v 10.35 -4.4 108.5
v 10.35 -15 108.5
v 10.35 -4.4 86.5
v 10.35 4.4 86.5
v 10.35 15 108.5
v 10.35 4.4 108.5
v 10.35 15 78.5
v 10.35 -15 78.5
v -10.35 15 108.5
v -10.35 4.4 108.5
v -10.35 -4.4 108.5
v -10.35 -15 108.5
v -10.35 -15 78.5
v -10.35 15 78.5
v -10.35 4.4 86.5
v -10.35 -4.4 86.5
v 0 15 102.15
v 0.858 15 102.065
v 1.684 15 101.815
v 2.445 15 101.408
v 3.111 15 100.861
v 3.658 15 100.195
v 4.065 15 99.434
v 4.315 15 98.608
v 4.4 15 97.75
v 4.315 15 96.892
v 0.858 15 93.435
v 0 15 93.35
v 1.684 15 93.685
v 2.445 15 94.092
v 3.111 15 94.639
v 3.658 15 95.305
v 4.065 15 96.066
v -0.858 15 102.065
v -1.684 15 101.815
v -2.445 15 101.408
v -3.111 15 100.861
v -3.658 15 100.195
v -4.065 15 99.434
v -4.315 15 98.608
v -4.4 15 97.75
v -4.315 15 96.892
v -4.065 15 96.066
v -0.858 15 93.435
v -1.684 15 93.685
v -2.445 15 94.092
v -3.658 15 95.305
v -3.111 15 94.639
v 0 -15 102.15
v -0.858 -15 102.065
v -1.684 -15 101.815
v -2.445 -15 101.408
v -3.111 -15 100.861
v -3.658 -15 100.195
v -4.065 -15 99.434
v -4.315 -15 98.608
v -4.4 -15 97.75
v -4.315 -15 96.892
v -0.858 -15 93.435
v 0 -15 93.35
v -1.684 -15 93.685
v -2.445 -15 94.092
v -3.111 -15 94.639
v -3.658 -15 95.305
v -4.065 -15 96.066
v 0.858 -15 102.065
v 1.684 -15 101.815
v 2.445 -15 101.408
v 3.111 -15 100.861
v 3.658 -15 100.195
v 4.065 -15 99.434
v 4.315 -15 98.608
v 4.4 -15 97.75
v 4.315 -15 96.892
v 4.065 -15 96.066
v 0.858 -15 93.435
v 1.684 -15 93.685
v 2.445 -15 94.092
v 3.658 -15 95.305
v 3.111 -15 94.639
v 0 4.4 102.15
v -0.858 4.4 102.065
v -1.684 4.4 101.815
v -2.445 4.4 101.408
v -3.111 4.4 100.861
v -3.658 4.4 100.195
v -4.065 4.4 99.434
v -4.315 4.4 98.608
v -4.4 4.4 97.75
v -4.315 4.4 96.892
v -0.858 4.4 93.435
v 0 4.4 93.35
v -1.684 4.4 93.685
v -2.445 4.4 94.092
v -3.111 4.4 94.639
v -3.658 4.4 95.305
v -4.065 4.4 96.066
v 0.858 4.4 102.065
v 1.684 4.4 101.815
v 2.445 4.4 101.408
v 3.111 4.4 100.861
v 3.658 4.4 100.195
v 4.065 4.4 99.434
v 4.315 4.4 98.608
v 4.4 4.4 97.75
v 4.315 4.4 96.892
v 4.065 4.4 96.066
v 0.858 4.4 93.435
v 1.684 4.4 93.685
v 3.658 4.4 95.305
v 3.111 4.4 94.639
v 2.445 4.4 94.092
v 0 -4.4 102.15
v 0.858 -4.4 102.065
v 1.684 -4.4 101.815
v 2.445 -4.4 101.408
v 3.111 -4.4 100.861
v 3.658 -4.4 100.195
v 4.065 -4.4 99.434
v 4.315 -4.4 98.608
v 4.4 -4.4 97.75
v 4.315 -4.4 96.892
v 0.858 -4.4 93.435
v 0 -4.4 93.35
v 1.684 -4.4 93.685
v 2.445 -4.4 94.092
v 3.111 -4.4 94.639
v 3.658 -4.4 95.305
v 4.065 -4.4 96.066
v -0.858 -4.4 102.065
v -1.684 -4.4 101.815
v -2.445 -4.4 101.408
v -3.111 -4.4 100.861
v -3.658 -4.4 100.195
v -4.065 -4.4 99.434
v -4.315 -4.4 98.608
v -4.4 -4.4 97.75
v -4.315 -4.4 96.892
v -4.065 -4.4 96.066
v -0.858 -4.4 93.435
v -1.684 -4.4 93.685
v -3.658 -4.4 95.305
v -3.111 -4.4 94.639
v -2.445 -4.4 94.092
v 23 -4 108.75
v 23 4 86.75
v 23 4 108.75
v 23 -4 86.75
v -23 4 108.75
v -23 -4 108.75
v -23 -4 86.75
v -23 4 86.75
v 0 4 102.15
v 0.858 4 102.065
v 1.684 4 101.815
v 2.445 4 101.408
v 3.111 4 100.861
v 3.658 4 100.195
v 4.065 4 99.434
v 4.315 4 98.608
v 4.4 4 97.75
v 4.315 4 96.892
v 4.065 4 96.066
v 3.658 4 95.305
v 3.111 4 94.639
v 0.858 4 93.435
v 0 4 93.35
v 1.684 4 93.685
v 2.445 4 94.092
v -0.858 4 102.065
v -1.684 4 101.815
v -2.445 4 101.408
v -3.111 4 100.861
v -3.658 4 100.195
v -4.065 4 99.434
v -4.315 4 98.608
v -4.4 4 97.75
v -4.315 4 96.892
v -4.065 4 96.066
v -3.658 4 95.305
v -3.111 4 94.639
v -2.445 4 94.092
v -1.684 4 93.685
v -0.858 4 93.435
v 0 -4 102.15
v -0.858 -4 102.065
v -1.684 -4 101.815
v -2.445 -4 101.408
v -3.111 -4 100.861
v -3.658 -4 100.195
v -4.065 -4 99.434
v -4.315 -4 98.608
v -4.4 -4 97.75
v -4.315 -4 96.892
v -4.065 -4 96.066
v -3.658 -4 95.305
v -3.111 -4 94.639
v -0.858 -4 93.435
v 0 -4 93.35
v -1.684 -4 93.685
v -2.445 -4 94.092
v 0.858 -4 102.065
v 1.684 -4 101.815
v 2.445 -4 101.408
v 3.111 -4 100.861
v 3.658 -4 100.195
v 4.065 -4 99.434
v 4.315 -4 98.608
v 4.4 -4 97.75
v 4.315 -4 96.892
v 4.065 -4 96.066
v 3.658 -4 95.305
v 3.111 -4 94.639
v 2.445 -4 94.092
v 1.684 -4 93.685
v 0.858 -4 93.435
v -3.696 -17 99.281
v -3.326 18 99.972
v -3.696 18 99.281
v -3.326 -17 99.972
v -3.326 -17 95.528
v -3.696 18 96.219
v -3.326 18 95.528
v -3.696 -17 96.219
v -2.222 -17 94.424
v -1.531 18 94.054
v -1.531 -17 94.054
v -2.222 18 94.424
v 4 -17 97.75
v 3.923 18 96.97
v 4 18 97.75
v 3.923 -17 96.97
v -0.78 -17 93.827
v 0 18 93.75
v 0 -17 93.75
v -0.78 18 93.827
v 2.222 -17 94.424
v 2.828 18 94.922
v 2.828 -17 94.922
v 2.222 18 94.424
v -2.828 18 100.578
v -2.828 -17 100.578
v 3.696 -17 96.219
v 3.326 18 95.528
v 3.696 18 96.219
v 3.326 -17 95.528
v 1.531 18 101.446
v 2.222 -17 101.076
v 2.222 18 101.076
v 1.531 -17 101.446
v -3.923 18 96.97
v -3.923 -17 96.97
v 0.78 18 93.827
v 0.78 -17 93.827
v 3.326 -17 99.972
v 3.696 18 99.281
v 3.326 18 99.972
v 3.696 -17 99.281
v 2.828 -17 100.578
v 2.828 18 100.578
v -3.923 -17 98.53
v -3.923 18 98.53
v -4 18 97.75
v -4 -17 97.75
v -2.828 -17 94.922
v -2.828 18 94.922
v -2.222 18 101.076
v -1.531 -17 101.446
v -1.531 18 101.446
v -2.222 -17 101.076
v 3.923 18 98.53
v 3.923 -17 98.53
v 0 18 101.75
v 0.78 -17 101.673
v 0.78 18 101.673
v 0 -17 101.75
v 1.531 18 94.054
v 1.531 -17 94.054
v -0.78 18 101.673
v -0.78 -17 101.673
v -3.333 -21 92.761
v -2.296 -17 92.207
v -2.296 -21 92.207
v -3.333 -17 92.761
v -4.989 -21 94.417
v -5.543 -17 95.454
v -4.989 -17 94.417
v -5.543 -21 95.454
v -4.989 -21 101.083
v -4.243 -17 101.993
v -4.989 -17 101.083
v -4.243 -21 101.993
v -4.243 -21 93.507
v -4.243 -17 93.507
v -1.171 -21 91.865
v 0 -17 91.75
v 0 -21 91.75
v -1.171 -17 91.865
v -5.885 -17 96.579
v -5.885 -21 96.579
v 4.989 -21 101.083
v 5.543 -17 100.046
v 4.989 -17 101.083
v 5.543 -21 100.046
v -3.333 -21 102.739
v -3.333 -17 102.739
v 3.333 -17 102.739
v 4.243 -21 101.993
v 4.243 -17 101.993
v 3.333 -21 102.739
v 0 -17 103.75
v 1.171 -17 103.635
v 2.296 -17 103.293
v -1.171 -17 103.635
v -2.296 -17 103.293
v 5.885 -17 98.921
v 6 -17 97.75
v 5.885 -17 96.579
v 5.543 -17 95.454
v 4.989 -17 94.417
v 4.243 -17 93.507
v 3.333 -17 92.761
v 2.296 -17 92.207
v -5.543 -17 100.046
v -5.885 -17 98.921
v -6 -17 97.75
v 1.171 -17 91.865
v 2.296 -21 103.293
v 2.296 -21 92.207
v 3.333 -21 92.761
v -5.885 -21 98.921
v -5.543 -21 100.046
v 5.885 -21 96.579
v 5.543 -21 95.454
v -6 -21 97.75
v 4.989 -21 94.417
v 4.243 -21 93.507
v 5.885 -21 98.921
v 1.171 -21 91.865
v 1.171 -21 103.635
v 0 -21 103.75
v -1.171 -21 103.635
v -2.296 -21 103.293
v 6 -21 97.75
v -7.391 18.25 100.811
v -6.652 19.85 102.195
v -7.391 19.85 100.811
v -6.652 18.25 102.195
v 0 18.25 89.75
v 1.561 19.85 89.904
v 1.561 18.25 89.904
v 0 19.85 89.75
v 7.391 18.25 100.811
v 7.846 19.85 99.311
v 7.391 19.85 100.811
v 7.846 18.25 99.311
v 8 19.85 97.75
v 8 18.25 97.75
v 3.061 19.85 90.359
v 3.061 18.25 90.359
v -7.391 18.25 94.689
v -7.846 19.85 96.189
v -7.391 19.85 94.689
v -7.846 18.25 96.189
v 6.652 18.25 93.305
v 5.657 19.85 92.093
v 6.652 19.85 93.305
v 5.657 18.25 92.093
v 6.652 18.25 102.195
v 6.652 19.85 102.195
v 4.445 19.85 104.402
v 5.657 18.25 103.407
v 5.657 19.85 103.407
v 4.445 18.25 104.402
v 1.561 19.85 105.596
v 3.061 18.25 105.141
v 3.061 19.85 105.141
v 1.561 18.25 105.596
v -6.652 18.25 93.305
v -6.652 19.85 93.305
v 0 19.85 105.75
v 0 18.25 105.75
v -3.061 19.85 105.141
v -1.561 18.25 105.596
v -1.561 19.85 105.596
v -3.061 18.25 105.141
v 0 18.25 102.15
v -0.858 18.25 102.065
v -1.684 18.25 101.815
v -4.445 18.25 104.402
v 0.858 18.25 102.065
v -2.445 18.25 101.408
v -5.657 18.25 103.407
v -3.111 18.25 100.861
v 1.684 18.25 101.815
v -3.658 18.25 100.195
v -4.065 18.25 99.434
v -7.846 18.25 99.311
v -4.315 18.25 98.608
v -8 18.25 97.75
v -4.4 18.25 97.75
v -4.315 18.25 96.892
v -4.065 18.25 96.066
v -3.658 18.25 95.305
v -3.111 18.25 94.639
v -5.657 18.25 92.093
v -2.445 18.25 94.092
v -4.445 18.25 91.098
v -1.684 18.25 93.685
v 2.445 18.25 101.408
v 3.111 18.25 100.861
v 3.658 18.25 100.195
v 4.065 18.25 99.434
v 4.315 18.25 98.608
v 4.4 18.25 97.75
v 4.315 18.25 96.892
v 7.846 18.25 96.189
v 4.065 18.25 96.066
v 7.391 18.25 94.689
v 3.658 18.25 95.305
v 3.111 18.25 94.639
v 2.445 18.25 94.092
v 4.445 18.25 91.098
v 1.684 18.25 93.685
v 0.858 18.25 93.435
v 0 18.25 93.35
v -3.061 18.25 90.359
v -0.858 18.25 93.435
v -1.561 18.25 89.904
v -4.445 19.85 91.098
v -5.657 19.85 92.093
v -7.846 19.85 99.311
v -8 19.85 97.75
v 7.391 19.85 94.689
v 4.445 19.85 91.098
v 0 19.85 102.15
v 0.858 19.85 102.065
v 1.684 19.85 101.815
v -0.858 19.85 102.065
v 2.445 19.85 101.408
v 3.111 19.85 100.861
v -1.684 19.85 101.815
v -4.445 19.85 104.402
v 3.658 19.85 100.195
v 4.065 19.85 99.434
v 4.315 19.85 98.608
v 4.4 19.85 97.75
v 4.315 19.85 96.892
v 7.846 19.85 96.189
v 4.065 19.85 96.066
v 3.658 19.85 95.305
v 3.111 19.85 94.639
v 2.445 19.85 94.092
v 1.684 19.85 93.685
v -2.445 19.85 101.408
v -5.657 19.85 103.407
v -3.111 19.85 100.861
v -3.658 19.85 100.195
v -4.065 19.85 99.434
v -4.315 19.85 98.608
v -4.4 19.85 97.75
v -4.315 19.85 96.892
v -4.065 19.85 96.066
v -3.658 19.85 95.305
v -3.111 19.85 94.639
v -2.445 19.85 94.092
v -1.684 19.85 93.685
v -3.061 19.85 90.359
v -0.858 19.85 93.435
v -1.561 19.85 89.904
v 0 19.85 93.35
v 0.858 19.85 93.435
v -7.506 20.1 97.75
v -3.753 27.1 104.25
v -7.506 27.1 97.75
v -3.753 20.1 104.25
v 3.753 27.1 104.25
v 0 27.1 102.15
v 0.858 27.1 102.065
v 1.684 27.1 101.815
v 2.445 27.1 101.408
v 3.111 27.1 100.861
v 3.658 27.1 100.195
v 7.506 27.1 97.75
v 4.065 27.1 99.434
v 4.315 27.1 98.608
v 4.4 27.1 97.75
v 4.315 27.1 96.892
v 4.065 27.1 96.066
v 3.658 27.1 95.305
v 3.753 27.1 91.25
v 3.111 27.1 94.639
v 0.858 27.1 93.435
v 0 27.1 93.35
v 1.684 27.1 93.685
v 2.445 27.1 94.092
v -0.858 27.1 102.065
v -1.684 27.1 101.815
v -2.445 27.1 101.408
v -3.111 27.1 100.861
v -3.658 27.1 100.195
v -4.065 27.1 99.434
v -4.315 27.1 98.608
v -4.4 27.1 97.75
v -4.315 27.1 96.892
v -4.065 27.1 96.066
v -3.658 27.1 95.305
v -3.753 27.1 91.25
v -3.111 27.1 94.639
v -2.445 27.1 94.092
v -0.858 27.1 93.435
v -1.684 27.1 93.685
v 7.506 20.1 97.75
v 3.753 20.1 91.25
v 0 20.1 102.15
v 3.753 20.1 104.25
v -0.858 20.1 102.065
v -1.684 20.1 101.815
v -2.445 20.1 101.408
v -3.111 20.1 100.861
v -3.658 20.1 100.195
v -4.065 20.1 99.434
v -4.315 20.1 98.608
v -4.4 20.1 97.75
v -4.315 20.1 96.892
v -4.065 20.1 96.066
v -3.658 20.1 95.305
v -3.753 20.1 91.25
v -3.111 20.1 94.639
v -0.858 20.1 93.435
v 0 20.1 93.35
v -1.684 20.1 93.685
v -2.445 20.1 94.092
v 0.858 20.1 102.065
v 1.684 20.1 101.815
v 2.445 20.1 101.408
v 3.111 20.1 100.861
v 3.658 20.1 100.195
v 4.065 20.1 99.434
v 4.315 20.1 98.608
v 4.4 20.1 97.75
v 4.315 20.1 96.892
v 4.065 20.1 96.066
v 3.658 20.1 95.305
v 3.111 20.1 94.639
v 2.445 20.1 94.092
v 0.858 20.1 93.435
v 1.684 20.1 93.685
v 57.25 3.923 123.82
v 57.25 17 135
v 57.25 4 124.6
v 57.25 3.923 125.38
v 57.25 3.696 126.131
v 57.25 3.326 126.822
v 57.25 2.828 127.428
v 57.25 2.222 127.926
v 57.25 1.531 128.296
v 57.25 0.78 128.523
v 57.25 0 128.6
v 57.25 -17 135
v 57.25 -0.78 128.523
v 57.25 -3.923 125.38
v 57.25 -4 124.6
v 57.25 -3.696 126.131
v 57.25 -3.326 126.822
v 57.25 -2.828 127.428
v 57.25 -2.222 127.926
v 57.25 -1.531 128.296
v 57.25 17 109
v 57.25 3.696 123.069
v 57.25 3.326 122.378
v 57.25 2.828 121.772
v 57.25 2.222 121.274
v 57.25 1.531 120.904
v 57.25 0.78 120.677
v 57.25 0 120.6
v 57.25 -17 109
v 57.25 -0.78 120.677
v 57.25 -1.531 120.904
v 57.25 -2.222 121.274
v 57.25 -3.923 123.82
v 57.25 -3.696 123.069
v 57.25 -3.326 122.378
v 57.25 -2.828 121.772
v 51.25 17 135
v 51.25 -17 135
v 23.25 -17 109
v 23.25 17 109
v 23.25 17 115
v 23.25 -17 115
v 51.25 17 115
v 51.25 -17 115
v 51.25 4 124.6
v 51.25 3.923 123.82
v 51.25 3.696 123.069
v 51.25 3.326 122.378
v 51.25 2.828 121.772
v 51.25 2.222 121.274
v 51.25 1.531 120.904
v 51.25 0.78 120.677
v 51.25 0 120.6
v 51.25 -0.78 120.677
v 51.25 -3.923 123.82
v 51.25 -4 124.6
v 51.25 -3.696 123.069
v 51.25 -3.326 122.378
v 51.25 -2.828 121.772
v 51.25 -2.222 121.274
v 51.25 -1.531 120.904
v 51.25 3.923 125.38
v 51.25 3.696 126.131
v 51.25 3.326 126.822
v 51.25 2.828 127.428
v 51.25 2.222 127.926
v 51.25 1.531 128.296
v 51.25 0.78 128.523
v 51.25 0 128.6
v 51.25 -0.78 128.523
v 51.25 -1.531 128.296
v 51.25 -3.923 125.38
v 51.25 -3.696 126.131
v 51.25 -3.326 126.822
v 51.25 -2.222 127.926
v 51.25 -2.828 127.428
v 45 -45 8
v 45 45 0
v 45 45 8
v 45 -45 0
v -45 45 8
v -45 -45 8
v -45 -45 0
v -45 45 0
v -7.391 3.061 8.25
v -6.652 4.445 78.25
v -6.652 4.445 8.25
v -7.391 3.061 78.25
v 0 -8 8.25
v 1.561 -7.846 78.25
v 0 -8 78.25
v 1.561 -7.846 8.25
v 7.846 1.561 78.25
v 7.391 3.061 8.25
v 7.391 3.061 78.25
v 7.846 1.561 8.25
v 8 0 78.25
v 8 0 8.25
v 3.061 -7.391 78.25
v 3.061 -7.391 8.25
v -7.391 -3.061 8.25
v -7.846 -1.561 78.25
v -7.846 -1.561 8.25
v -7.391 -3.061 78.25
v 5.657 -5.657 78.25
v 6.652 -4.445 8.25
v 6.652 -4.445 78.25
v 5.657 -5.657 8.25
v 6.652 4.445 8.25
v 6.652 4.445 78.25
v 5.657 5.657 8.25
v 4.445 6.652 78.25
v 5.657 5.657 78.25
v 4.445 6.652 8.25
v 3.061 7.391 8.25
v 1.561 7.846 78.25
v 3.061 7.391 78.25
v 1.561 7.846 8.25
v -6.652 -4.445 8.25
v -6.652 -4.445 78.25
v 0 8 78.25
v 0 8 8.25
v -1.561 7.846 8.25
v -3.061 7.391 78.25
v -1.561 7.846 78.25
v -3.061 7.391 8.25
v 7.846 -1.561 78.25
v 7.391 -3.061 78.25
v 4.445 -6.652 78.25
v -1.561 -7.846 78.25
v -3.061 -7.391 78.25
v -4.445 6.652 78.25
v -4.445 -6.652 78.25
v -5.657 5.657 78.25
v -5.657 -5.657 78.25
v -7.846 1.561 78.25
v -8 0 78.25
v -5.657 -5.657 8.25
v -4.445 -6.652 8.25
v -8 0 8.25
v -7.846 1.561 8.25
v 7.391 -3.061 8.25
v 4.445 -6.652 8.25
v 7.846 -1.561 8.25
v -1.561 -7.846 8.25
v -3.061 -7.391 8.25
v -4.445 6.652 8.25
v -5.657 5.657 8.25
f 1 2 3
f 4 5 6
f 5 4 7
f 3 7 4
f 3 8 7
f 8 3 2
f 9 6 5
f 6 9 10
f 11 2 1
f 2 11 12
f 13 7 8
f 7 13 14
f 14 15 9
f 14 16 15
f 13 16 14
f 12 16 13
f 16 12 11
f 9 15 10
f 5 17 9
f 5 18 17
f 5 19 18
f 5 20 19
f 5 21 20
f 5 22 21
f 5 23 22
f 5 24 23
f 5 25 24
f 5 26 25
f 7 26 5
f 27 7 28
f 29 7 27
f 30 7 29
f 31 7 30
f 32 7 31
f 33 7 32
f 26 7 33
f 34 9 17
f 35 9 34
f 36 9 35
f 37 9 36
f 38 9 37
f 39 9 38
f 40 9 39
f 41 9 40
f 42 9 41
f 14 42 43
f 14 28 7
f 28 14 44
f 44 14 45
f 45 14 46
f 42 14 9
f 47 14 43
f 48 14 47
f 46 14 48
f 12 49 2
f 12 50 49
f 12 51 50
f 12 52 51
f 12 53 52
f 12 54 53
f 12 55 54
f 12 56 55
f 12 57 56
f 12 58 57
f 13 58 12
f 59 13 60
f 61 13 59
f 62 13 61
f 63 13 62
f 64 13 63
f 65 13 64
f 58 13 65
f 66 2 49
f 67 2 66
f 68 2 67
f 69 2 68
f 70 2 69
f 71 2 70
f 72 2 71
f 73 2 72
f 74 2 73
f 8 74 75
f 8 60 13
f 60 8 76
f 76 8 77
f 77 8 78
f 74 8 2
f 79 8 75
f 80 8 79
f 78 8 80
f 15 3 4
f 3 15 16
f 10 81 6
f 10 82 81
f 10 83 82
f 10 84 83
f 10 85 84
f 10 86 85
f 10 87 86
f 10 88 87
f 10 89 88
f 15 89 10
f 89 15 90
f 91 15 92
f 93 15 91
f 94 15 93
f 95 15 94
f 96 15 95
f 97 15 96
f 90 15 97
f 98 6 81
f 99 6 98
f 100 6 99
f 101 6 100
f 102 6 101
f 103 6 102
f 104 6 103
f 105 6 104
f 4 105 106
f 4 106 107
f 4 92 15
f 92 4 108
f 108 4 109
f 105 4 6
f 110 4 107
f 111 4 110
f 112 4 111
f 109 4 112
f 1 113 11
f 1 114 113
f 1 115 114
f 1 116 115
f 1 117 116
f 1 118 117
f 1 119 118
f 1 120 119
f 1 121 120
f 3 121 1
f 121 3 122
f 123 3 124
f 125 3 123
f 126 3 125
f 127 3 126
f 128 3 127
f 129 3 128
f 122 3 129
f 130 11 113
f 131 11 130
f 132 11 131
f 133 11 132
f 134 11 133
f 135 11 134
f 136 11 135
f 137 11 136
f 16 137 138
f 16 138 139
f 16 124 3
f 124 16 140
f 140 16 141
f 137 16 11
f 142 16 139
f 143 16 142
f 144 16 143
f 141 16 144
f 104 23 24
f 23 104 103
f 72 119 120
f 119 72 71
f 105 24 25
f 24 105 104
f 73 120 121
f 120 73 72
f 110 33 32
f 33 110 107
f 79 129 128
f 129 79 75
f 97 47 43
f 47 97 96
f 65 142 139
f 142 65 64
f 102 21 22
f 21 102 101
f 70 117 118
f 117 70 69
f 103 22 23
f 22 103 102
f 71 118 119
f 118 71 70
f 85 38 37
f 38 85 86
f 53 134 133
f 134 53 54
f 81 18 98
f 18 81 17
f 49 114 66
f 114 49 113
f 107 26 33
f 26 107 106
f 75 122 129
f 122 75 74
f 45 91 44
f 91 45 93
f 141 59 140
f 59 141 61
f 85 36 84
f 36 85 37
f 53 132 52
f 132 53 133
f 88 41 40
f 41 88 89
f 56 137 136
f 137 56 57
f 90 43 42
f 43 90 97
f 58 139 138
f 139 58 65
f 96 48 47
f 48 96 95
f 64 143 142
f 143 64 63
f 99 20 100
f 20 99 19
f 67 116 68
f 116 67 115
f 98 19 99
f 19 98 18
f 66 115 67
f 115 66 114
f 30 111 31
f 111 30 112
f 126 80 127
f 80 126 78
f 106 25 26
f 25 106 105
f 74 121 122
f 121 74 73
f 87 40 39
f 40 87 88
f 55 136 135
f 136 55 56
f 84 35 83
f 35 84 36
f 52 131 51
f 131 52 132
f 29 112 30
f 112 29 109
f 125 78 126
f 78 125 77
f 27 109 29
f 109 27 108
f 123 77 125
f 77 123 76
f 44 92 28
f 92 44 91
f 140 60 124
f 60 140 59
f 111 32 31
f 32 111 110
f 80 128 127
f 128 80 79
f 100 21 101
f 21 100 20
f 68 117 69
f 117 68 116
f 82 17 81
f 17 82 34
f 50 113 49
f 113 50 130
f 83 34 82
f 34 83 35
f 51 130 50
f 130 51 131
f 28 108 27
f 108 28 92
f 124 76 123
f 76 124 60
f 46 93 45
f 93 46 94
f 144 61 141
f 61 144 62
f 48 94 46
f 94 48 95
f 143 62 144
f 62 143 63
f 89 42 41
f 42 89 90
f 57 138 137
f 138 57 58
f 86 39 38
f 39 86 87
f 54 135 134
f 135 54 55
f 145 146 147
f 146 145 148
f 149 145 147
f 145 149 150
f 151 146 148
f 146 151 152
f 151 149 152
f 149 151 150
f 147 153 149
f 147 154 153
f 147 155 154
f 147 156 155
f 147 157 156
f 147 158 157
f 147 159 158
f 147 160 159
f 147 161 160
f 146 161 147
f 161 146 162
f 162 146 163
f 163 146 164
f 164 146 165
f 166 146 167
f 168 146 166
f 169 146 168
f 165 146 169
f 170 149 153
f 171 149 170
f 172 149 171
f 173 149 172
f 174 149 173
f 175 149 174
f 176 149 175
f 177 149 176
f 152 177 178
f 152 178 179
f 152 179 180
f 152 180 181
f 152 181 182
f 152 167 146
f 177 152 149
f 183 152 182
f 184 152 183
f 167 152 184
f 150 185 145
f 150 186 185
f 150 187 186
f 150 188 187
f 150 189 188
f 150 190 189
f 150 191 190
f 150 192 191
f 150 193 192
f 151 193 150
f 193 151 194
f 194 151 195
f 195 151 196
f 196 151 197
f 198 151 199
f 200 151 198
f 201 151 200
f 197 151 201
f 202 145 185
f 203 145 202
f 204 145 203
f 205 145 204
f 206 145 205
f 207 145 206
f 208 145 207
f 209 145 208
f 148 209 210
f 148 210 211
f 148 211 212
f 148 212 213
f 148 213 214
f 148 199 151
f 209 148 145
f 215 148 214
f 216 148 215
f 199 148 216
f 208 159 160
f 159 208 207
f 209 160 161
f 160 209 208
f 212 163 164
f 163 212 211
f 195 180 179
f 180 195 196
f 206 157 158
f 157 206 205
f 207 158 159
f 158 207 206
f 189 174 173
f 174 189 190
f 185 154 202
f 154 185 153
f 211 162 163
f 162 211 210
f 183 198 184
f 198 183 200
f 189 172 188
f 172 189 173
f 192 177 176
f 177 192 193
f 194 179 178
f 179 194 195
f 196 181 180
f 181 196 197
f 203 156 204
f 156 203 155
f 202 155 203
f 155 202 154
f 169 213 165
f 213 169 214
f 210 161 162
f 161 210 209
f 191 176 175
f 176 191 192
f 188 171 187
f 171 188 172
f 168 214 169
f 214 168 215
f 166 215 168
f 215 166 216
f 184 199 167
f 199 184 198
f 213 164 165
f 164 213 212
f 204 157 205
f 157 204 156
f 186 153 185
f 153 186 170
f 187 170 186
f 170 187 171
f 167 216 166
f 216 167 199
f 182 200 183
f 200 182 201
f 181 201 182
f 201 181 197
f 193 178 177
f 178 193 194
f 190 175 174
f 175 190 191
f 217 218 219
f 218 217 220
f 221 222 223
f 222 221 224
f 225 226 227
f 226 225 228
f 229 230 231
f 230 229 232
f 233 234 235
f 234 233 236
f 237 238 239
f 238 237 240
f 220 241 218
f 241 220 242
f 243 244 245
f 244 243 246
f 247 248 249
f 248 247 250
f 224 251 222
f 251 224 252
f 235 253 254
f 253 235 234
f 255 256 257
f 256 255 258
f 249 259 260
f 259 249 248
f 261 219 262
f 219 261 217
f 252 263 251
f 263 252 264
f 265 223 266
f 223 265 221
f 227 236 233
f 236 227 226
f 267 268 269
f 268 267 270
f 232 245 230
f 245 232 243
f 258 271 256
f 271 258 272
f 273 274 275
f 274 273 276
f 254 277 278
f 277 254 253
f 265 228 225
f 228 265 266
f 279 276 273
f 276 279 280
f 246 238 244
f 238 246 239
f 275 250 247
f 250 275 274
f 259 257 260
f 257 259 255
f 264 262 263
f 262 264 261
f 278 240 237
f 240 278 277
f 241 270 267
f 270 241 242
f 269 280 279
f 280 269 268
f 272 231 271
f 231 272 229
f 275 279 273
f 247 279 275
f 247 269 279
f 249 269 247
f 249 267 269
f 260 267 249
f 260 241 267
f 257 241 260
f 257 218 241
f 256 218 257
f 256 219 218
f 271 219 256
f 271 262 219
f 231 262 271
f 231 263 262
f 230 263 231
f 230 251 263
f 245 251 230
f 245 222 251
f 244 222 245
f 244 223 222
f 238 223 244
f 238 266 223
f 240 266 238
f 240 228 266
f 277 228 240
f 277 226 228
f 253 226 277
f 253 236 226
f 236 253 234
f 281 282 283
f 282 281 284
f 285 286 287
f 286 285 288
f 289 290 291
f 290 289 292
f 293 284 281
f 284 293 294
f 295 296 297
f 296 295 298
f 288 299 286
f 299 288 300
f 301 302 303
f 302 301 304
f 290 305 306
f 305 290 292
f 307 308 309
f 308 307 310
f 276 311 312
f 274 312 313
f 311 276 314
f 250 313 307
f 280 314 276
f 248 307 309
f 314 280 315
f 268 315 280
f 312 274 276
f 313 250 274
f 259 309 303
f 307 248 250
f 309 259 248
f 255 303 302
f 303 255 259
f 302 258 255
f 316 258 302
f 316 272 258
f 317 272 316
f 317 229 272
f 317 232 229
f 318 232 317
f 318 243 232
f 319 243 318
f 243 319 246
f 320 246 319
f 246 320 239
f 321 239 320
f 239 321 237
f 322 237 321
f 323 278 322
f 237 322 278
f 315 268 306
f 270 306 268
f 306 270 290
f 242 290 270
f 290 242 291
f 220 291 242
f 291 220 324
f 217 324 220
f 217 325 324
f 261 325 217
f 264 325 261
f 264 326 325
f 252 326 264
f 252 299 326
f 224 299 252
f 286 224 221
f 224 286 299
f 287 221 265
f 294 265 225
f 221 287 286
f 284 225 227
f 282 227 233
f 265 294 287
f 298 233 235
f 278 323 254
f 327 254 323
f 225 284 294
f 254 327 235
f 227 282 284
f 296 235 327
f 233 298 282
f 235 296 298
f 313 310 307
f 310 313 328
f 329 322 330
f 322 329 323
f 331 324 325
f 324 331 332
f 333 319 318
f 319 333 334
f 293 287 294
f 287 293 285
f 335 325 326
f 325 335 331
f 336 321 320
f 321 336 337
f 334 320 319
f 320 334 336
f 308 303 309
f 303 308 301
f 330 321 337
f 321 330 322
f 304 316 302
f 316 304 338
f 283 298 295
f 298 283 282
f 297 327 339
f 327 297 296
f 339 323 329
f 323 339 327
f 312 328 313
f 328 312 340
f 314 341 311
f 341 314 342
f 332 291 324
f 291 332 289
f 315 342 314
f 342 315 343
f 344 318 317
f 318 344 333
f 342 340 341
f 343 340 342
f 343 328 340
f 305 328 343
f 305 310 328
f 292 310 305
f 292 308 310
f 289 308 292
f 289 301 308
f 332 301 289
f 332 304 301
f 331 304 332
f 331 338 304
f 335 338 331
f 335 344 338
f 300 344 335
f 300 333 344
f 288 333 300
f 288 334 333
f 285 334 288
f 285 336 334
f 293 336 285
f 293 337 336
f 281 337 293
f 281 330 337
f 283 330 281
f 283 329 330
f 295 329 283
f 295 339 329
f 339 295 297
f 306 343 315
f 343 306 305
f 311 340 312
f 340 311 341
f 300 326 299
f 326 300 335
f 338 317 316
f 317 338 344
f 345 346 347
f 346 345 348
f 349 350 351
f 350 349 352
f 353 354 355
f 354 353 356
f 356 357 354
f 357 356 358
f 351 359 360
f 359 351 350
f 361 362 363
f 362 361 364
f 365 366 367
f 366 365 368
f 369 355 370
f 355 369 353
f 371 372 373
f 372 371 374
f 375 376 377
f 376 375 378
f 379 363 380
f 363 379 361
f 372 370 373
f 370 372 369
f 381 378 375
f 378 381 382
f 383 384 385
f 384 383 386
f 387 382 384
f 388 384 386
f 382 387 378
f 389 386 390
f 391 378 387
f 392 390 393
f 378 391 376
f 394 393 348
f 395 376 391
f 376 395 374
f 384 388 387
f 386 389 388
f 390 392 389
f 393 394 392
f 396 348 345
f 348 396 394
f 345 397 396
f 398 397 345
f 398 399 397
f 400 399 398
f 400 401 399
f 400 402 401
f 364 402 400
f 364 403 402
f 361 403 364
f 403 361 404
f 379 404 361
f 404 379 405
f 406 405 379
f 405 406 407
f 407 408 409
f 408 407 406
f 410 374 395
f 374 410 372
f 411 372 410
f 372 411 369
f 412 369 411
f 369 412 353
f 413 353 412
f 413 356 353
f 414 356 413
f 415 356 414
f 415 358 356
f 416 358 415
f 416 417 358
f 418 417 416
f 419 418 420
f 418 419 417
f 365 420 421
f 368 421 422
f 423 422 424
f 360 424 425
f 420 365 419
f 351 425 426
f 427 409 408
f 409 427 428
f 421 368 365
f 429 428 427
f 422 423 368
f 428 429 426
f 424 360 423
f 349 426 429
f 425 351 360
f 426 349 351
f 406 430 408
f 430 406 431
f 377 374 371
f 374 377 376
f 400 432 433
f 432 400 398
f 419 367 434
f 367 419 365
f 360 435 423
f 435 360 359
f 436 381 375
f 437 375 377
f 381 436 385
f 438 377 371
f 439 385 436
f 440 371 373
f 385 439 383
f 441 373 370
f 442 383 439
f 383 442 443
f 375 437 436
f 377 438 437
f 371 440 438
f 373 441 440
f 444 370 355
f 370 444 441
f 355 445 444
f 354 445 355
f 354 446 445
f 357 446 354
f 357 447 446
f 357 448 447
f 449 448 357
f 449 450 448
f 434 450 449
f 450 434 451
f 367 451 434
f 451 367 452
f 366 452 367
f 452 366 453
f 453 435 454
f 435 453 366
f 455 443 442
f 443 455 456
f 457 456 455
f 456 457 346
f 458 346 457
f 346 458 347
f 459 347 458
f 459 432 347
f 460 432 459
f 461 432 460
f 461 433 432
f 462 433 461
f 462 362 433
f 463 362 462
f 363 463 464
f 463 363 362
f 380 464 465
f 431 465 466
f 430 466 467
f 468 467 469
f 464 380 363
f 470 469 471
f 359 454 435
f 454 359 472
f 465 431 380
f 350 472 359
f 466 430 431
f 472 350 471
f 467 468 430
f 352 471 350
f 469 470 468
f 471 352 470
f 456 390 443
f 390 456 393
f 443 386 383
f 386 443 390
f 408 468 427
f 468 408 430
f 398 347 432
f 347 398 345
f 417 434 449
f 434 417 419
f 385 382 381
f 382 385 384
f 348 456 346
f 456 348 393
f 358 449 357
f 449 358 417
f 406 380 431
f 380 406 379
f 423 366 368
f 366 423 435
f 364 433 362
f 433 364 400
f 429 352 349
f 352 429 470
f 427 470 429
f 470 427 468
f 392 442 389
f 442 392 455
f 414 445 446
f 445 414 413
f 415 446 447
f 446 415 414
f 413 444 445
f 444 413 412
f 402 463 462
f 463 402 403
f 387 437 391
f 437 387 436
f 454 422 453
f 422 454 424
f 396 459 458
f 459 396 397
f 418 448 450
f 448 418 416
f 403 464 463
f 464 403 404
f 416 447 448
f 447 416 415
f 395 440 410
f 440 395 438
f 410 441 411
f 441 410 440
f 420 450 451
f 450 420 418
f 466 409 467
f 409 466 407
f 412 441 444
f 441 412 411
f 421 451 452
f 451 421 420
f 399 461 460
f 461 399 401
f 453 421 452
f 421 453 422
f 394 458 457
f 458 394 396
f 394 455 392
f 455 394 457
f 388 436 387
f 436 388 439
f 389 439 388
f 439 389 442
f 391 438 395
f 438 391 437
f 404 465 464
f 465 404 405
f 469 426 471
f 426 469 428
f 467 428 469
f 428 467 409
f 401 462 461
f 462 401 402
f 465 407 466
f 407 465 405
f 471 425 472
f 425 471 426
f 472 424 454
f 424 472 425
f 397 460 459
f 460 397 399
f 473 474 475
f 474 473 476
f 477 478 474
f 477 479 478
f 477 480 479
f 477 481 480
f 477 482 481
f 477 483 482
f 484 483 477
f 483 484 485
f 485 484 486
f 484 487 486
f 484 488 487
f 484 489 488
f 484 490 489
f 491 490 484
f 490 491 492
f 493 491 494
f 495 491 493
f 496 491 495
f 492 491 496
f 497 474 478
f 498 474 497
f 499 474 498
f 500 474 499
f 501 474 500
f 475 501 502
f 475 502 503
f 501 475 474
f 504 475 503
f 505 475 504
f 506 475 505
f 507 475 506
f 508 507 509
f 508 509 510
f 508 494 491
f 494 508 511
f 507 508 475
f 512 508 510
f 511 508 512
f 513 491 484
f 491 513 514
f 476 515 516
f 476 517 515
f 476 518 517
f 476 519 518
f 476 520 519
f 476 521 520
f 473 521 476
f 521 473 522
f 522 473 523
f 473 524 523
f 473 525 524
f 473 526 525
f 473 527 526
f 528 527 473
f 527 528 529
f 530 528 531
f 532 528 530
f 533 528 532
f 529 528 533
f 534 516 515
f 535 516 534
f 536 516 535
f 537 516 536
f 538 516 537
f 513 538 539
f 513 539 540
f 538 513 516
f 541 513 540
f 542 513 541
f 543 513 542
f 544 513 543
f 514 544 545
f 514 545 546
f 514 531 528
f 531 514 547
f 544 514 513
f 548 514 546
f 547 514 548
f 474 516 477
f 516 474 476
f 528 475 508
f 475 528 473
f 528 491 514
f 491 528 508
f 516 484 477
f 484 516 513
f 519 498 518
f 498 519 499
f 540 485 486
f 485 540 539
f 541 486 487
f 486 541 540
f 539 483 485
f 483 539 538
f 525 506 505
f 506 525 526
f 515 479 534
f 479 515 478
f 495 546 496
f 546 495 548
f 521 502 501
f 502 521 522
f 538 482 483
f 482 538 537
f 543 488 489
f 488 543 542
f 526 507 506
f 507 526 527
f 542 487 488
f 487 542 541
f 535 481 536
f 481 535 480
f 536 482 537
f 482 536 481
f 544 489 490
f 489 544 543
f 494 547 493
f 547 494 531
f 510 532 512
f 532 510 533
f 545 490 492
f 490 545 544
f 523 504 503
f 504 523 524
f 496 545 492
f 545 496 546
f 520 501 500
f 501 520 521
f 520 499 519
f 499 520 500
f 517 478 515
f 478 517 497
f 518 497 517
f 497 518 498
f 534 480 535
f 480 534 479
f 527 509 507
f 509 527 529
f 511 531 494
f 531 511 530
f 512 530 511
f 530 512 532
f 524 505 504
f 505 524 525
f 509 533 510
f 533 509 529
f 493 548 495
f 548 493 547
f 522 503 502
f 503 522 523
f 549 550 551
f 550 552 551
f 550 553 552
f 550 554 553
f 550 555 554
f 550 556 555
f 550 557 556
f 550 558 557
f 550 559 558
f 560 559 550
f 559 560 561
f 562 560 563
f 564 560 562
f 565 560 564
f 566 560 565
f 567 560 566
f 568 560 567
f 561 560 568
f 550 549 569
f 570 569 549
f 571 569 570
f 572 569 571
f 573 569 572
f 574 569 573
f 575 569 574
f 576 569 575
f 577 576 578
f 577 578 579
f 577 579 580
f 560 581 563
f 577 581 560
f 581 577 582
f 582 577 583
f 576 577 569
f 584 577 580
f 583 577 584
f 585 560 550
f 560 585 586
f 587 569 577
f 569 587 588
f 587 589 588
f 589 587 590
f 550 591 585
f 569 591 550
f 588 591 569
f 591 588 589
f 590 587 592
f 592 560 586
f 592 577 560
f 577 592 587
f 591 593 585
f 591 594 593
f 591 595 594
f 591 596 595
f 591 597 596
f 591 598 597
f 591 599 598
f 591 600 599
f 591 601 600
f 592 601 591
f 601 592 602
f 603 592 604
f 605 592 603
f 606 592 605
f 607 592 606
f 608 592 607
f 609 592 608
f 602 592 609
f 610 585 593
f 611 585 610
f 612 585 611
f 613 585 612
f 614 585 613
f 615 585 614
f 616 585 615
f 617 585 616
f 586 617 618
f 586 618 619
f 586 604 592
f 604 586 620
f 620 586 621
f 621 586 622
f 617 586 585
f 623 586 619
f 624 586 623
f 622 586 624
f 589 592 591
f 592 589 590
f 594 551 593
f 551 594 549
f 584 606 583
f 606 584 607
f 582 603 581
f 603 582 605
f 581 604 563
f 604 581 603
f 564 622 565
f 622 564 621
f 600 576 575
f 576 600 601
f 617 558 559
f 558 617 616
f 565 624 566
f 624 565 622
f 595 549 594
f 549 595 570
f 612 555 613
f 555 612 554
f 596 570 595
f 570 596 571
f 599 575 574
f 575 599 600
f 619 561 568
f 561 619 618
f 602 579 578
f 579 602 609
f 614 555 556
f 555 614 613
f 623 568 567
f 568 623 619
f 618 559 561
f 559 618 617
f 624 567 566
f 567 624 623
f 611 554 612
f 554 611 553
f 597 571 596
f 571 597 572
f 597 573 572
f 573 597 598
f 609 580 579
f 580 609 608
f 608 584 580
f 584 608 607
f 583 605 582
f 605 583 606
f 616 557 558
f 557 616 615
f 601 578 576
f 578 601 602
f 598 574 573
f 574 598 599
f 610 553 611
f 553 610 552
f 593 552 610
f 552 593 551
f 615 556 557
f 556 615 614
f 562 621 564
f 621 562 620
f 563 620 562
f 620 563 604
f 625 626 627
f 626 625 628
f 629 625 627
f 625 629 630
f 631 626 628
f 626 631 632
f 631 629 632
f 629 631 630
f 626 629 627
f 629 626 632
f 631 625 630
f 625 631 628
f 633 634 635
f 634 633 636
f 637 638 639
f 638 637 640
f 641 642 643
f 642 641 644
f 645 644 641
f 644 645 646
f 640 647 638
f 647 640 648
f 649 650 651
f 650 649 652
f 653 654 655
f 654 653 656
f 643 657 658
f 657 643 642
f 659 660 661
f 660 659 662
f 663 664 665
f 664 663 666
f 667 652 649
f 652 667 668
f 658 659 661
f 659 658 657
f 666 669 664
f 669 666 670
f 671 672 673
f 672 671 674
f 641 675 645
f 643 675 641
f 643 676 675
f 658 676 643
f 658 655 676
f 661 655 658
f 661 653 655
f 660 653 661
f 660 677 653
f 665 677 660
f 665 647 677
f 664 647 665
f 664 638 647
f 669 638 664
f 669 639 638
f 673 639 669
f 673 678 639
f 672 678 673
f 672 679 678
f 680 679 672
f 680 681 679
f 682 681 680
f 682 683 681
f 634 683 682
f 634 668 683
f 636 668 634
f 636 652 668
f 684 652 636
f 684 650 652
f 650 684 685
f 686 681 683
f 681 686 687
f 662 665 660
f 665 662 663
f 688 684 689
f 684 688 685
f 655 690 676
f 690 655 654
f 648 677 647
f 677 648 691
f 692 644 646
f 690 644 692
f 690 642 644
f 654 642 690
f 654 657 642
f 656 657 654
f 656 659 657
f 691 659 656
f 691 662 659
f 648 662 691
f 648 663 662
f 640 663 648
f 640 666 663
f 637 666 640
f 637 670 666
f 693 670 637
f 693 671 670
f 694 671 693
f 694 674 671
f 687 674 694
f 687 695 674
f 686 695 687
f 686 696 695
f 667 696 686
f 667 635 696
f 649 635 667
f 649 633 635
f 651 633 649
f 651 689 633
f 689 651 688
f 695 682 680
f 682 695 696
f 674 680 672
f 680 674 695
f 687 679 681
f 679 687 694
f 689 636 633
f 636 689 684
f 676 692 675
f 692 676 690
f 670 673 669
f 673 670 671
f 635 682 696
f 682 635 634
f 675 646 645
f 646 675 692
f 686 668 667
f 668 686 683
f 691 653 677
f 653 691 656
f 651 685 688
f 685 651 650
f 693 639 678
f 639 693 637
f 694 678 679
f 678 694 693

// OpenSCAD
$fn = 32;

// ------------------------------------------------------------------------
// Lamp arm: column d16 x 70 mm, arm 46 mm
// Every part is its own module, assembly() places every instance.
// ------------------------------------------------------------------------

// --- part 1 ---
module lamp_base() {
  difference() {
    translate([-45, -45, 0]) cube([90, 90, 8]);
  }
}

// --- part 2 ---
module lamp_column() {
  cylinder(h = 70, d = 16);
}

// --- part 3 ---
module head_fork() {
  difference() {
    translate([-10.35, -15, 0]) cube([20.7, 30, 30]);
    translate([-11.35, -4.4, 8]) cube([22.7, 8.8, 23]);
    translate([0, 0, 19.25]) rotate([90, 0, 0]) cylinder(h = 32, d = 8.8, center = true);
  }
}

// --- part 4 ---
module lamp_arm() {
  difference() {
    translate([-23, -4, 0]) cube([46, 8, 22]);
    translate([0, 0, 11]) rotate([90, 0, 0]) cylinder(h = 10, d = 8.8, center = true);
  }
}

// --- part 5 ---
module arm_pin() {
  rotate([0, 90, 0]) cylinder(h = 36, d = 8, center = true);
  translate([-21, 0, 0]) rotate([0, 90, 0]) cylinder(h = 4, d = 12);
}

// --- part 6 ---
module arm_washer() {
  difference() {
      translate([0, 0, 0]) cylinder(h = 1.6, d = 16);
      translate([0, 0, -1]) cylinder(h = 3.6, d = 8.8);
    }
}

// --- part 7 ---
module arm_nut() {
  difference() {
    linear_extrude(height = 7) polygon(points = [[7.506, 0], [3.753, 6.5], [-3.753, 6.5], [-7.506, 0], [-3.753, -6.5], [3.753, -6.5]]);
    translate([0, 0, -1]) cylinder(h = 9, d = 8.8);
  }
}

// --- part 8 ---
module shade_bracket() {
  difference() {
    translate([-17, -17, 0]) cube([34, 34, 26]);
    translate([-18, -18, 6]) cube([29, 36, 21]);
    translate([14, 0, 15.6]) rotate([0, 90, 0]) cylinder(h = 8, d = 8, center = true);
  }
}

// --- assembly ---
module assembly() {
  color([0.80, 0.24, 0.20]) translate([0, 0, 0]) rotate([0, 0, 0]) lamp_base();
  color([0.20, 0.45, 0.75]) translate([0, 0, 8.25]) rotate([0, 0, 0]) lamp_column();
  color([0.25, 0.62, 0.32]) translate([0, 0, 78.5]) rotate([0, 0, 0]) head_fork();
  color([0.92, 0.70, 0.18]) translate([0, 0, 86.75]) rotate([0, 0, 0]) lamp_arm();
  color([0.58, 0.35, 0.70]) translate([0, 0, 97.75]) rotate([0, 0, 90]) arm_pin();
  color([0.16, 0.66, 0.66]) translate([0, 19.85, 97.75]) rotate([90, 0, 0]) arm_washer();
  color([0.85, 0.48, 0.18]) translate([0, 27.1, 97.75]) rotate([90, 0, 0]) arm_nut();
  color([0.55, 0.60, 0.65]) translate([40.25, 0, 109]) rotate([0, 0, 0]) shade_bracket();
}

assembly();
